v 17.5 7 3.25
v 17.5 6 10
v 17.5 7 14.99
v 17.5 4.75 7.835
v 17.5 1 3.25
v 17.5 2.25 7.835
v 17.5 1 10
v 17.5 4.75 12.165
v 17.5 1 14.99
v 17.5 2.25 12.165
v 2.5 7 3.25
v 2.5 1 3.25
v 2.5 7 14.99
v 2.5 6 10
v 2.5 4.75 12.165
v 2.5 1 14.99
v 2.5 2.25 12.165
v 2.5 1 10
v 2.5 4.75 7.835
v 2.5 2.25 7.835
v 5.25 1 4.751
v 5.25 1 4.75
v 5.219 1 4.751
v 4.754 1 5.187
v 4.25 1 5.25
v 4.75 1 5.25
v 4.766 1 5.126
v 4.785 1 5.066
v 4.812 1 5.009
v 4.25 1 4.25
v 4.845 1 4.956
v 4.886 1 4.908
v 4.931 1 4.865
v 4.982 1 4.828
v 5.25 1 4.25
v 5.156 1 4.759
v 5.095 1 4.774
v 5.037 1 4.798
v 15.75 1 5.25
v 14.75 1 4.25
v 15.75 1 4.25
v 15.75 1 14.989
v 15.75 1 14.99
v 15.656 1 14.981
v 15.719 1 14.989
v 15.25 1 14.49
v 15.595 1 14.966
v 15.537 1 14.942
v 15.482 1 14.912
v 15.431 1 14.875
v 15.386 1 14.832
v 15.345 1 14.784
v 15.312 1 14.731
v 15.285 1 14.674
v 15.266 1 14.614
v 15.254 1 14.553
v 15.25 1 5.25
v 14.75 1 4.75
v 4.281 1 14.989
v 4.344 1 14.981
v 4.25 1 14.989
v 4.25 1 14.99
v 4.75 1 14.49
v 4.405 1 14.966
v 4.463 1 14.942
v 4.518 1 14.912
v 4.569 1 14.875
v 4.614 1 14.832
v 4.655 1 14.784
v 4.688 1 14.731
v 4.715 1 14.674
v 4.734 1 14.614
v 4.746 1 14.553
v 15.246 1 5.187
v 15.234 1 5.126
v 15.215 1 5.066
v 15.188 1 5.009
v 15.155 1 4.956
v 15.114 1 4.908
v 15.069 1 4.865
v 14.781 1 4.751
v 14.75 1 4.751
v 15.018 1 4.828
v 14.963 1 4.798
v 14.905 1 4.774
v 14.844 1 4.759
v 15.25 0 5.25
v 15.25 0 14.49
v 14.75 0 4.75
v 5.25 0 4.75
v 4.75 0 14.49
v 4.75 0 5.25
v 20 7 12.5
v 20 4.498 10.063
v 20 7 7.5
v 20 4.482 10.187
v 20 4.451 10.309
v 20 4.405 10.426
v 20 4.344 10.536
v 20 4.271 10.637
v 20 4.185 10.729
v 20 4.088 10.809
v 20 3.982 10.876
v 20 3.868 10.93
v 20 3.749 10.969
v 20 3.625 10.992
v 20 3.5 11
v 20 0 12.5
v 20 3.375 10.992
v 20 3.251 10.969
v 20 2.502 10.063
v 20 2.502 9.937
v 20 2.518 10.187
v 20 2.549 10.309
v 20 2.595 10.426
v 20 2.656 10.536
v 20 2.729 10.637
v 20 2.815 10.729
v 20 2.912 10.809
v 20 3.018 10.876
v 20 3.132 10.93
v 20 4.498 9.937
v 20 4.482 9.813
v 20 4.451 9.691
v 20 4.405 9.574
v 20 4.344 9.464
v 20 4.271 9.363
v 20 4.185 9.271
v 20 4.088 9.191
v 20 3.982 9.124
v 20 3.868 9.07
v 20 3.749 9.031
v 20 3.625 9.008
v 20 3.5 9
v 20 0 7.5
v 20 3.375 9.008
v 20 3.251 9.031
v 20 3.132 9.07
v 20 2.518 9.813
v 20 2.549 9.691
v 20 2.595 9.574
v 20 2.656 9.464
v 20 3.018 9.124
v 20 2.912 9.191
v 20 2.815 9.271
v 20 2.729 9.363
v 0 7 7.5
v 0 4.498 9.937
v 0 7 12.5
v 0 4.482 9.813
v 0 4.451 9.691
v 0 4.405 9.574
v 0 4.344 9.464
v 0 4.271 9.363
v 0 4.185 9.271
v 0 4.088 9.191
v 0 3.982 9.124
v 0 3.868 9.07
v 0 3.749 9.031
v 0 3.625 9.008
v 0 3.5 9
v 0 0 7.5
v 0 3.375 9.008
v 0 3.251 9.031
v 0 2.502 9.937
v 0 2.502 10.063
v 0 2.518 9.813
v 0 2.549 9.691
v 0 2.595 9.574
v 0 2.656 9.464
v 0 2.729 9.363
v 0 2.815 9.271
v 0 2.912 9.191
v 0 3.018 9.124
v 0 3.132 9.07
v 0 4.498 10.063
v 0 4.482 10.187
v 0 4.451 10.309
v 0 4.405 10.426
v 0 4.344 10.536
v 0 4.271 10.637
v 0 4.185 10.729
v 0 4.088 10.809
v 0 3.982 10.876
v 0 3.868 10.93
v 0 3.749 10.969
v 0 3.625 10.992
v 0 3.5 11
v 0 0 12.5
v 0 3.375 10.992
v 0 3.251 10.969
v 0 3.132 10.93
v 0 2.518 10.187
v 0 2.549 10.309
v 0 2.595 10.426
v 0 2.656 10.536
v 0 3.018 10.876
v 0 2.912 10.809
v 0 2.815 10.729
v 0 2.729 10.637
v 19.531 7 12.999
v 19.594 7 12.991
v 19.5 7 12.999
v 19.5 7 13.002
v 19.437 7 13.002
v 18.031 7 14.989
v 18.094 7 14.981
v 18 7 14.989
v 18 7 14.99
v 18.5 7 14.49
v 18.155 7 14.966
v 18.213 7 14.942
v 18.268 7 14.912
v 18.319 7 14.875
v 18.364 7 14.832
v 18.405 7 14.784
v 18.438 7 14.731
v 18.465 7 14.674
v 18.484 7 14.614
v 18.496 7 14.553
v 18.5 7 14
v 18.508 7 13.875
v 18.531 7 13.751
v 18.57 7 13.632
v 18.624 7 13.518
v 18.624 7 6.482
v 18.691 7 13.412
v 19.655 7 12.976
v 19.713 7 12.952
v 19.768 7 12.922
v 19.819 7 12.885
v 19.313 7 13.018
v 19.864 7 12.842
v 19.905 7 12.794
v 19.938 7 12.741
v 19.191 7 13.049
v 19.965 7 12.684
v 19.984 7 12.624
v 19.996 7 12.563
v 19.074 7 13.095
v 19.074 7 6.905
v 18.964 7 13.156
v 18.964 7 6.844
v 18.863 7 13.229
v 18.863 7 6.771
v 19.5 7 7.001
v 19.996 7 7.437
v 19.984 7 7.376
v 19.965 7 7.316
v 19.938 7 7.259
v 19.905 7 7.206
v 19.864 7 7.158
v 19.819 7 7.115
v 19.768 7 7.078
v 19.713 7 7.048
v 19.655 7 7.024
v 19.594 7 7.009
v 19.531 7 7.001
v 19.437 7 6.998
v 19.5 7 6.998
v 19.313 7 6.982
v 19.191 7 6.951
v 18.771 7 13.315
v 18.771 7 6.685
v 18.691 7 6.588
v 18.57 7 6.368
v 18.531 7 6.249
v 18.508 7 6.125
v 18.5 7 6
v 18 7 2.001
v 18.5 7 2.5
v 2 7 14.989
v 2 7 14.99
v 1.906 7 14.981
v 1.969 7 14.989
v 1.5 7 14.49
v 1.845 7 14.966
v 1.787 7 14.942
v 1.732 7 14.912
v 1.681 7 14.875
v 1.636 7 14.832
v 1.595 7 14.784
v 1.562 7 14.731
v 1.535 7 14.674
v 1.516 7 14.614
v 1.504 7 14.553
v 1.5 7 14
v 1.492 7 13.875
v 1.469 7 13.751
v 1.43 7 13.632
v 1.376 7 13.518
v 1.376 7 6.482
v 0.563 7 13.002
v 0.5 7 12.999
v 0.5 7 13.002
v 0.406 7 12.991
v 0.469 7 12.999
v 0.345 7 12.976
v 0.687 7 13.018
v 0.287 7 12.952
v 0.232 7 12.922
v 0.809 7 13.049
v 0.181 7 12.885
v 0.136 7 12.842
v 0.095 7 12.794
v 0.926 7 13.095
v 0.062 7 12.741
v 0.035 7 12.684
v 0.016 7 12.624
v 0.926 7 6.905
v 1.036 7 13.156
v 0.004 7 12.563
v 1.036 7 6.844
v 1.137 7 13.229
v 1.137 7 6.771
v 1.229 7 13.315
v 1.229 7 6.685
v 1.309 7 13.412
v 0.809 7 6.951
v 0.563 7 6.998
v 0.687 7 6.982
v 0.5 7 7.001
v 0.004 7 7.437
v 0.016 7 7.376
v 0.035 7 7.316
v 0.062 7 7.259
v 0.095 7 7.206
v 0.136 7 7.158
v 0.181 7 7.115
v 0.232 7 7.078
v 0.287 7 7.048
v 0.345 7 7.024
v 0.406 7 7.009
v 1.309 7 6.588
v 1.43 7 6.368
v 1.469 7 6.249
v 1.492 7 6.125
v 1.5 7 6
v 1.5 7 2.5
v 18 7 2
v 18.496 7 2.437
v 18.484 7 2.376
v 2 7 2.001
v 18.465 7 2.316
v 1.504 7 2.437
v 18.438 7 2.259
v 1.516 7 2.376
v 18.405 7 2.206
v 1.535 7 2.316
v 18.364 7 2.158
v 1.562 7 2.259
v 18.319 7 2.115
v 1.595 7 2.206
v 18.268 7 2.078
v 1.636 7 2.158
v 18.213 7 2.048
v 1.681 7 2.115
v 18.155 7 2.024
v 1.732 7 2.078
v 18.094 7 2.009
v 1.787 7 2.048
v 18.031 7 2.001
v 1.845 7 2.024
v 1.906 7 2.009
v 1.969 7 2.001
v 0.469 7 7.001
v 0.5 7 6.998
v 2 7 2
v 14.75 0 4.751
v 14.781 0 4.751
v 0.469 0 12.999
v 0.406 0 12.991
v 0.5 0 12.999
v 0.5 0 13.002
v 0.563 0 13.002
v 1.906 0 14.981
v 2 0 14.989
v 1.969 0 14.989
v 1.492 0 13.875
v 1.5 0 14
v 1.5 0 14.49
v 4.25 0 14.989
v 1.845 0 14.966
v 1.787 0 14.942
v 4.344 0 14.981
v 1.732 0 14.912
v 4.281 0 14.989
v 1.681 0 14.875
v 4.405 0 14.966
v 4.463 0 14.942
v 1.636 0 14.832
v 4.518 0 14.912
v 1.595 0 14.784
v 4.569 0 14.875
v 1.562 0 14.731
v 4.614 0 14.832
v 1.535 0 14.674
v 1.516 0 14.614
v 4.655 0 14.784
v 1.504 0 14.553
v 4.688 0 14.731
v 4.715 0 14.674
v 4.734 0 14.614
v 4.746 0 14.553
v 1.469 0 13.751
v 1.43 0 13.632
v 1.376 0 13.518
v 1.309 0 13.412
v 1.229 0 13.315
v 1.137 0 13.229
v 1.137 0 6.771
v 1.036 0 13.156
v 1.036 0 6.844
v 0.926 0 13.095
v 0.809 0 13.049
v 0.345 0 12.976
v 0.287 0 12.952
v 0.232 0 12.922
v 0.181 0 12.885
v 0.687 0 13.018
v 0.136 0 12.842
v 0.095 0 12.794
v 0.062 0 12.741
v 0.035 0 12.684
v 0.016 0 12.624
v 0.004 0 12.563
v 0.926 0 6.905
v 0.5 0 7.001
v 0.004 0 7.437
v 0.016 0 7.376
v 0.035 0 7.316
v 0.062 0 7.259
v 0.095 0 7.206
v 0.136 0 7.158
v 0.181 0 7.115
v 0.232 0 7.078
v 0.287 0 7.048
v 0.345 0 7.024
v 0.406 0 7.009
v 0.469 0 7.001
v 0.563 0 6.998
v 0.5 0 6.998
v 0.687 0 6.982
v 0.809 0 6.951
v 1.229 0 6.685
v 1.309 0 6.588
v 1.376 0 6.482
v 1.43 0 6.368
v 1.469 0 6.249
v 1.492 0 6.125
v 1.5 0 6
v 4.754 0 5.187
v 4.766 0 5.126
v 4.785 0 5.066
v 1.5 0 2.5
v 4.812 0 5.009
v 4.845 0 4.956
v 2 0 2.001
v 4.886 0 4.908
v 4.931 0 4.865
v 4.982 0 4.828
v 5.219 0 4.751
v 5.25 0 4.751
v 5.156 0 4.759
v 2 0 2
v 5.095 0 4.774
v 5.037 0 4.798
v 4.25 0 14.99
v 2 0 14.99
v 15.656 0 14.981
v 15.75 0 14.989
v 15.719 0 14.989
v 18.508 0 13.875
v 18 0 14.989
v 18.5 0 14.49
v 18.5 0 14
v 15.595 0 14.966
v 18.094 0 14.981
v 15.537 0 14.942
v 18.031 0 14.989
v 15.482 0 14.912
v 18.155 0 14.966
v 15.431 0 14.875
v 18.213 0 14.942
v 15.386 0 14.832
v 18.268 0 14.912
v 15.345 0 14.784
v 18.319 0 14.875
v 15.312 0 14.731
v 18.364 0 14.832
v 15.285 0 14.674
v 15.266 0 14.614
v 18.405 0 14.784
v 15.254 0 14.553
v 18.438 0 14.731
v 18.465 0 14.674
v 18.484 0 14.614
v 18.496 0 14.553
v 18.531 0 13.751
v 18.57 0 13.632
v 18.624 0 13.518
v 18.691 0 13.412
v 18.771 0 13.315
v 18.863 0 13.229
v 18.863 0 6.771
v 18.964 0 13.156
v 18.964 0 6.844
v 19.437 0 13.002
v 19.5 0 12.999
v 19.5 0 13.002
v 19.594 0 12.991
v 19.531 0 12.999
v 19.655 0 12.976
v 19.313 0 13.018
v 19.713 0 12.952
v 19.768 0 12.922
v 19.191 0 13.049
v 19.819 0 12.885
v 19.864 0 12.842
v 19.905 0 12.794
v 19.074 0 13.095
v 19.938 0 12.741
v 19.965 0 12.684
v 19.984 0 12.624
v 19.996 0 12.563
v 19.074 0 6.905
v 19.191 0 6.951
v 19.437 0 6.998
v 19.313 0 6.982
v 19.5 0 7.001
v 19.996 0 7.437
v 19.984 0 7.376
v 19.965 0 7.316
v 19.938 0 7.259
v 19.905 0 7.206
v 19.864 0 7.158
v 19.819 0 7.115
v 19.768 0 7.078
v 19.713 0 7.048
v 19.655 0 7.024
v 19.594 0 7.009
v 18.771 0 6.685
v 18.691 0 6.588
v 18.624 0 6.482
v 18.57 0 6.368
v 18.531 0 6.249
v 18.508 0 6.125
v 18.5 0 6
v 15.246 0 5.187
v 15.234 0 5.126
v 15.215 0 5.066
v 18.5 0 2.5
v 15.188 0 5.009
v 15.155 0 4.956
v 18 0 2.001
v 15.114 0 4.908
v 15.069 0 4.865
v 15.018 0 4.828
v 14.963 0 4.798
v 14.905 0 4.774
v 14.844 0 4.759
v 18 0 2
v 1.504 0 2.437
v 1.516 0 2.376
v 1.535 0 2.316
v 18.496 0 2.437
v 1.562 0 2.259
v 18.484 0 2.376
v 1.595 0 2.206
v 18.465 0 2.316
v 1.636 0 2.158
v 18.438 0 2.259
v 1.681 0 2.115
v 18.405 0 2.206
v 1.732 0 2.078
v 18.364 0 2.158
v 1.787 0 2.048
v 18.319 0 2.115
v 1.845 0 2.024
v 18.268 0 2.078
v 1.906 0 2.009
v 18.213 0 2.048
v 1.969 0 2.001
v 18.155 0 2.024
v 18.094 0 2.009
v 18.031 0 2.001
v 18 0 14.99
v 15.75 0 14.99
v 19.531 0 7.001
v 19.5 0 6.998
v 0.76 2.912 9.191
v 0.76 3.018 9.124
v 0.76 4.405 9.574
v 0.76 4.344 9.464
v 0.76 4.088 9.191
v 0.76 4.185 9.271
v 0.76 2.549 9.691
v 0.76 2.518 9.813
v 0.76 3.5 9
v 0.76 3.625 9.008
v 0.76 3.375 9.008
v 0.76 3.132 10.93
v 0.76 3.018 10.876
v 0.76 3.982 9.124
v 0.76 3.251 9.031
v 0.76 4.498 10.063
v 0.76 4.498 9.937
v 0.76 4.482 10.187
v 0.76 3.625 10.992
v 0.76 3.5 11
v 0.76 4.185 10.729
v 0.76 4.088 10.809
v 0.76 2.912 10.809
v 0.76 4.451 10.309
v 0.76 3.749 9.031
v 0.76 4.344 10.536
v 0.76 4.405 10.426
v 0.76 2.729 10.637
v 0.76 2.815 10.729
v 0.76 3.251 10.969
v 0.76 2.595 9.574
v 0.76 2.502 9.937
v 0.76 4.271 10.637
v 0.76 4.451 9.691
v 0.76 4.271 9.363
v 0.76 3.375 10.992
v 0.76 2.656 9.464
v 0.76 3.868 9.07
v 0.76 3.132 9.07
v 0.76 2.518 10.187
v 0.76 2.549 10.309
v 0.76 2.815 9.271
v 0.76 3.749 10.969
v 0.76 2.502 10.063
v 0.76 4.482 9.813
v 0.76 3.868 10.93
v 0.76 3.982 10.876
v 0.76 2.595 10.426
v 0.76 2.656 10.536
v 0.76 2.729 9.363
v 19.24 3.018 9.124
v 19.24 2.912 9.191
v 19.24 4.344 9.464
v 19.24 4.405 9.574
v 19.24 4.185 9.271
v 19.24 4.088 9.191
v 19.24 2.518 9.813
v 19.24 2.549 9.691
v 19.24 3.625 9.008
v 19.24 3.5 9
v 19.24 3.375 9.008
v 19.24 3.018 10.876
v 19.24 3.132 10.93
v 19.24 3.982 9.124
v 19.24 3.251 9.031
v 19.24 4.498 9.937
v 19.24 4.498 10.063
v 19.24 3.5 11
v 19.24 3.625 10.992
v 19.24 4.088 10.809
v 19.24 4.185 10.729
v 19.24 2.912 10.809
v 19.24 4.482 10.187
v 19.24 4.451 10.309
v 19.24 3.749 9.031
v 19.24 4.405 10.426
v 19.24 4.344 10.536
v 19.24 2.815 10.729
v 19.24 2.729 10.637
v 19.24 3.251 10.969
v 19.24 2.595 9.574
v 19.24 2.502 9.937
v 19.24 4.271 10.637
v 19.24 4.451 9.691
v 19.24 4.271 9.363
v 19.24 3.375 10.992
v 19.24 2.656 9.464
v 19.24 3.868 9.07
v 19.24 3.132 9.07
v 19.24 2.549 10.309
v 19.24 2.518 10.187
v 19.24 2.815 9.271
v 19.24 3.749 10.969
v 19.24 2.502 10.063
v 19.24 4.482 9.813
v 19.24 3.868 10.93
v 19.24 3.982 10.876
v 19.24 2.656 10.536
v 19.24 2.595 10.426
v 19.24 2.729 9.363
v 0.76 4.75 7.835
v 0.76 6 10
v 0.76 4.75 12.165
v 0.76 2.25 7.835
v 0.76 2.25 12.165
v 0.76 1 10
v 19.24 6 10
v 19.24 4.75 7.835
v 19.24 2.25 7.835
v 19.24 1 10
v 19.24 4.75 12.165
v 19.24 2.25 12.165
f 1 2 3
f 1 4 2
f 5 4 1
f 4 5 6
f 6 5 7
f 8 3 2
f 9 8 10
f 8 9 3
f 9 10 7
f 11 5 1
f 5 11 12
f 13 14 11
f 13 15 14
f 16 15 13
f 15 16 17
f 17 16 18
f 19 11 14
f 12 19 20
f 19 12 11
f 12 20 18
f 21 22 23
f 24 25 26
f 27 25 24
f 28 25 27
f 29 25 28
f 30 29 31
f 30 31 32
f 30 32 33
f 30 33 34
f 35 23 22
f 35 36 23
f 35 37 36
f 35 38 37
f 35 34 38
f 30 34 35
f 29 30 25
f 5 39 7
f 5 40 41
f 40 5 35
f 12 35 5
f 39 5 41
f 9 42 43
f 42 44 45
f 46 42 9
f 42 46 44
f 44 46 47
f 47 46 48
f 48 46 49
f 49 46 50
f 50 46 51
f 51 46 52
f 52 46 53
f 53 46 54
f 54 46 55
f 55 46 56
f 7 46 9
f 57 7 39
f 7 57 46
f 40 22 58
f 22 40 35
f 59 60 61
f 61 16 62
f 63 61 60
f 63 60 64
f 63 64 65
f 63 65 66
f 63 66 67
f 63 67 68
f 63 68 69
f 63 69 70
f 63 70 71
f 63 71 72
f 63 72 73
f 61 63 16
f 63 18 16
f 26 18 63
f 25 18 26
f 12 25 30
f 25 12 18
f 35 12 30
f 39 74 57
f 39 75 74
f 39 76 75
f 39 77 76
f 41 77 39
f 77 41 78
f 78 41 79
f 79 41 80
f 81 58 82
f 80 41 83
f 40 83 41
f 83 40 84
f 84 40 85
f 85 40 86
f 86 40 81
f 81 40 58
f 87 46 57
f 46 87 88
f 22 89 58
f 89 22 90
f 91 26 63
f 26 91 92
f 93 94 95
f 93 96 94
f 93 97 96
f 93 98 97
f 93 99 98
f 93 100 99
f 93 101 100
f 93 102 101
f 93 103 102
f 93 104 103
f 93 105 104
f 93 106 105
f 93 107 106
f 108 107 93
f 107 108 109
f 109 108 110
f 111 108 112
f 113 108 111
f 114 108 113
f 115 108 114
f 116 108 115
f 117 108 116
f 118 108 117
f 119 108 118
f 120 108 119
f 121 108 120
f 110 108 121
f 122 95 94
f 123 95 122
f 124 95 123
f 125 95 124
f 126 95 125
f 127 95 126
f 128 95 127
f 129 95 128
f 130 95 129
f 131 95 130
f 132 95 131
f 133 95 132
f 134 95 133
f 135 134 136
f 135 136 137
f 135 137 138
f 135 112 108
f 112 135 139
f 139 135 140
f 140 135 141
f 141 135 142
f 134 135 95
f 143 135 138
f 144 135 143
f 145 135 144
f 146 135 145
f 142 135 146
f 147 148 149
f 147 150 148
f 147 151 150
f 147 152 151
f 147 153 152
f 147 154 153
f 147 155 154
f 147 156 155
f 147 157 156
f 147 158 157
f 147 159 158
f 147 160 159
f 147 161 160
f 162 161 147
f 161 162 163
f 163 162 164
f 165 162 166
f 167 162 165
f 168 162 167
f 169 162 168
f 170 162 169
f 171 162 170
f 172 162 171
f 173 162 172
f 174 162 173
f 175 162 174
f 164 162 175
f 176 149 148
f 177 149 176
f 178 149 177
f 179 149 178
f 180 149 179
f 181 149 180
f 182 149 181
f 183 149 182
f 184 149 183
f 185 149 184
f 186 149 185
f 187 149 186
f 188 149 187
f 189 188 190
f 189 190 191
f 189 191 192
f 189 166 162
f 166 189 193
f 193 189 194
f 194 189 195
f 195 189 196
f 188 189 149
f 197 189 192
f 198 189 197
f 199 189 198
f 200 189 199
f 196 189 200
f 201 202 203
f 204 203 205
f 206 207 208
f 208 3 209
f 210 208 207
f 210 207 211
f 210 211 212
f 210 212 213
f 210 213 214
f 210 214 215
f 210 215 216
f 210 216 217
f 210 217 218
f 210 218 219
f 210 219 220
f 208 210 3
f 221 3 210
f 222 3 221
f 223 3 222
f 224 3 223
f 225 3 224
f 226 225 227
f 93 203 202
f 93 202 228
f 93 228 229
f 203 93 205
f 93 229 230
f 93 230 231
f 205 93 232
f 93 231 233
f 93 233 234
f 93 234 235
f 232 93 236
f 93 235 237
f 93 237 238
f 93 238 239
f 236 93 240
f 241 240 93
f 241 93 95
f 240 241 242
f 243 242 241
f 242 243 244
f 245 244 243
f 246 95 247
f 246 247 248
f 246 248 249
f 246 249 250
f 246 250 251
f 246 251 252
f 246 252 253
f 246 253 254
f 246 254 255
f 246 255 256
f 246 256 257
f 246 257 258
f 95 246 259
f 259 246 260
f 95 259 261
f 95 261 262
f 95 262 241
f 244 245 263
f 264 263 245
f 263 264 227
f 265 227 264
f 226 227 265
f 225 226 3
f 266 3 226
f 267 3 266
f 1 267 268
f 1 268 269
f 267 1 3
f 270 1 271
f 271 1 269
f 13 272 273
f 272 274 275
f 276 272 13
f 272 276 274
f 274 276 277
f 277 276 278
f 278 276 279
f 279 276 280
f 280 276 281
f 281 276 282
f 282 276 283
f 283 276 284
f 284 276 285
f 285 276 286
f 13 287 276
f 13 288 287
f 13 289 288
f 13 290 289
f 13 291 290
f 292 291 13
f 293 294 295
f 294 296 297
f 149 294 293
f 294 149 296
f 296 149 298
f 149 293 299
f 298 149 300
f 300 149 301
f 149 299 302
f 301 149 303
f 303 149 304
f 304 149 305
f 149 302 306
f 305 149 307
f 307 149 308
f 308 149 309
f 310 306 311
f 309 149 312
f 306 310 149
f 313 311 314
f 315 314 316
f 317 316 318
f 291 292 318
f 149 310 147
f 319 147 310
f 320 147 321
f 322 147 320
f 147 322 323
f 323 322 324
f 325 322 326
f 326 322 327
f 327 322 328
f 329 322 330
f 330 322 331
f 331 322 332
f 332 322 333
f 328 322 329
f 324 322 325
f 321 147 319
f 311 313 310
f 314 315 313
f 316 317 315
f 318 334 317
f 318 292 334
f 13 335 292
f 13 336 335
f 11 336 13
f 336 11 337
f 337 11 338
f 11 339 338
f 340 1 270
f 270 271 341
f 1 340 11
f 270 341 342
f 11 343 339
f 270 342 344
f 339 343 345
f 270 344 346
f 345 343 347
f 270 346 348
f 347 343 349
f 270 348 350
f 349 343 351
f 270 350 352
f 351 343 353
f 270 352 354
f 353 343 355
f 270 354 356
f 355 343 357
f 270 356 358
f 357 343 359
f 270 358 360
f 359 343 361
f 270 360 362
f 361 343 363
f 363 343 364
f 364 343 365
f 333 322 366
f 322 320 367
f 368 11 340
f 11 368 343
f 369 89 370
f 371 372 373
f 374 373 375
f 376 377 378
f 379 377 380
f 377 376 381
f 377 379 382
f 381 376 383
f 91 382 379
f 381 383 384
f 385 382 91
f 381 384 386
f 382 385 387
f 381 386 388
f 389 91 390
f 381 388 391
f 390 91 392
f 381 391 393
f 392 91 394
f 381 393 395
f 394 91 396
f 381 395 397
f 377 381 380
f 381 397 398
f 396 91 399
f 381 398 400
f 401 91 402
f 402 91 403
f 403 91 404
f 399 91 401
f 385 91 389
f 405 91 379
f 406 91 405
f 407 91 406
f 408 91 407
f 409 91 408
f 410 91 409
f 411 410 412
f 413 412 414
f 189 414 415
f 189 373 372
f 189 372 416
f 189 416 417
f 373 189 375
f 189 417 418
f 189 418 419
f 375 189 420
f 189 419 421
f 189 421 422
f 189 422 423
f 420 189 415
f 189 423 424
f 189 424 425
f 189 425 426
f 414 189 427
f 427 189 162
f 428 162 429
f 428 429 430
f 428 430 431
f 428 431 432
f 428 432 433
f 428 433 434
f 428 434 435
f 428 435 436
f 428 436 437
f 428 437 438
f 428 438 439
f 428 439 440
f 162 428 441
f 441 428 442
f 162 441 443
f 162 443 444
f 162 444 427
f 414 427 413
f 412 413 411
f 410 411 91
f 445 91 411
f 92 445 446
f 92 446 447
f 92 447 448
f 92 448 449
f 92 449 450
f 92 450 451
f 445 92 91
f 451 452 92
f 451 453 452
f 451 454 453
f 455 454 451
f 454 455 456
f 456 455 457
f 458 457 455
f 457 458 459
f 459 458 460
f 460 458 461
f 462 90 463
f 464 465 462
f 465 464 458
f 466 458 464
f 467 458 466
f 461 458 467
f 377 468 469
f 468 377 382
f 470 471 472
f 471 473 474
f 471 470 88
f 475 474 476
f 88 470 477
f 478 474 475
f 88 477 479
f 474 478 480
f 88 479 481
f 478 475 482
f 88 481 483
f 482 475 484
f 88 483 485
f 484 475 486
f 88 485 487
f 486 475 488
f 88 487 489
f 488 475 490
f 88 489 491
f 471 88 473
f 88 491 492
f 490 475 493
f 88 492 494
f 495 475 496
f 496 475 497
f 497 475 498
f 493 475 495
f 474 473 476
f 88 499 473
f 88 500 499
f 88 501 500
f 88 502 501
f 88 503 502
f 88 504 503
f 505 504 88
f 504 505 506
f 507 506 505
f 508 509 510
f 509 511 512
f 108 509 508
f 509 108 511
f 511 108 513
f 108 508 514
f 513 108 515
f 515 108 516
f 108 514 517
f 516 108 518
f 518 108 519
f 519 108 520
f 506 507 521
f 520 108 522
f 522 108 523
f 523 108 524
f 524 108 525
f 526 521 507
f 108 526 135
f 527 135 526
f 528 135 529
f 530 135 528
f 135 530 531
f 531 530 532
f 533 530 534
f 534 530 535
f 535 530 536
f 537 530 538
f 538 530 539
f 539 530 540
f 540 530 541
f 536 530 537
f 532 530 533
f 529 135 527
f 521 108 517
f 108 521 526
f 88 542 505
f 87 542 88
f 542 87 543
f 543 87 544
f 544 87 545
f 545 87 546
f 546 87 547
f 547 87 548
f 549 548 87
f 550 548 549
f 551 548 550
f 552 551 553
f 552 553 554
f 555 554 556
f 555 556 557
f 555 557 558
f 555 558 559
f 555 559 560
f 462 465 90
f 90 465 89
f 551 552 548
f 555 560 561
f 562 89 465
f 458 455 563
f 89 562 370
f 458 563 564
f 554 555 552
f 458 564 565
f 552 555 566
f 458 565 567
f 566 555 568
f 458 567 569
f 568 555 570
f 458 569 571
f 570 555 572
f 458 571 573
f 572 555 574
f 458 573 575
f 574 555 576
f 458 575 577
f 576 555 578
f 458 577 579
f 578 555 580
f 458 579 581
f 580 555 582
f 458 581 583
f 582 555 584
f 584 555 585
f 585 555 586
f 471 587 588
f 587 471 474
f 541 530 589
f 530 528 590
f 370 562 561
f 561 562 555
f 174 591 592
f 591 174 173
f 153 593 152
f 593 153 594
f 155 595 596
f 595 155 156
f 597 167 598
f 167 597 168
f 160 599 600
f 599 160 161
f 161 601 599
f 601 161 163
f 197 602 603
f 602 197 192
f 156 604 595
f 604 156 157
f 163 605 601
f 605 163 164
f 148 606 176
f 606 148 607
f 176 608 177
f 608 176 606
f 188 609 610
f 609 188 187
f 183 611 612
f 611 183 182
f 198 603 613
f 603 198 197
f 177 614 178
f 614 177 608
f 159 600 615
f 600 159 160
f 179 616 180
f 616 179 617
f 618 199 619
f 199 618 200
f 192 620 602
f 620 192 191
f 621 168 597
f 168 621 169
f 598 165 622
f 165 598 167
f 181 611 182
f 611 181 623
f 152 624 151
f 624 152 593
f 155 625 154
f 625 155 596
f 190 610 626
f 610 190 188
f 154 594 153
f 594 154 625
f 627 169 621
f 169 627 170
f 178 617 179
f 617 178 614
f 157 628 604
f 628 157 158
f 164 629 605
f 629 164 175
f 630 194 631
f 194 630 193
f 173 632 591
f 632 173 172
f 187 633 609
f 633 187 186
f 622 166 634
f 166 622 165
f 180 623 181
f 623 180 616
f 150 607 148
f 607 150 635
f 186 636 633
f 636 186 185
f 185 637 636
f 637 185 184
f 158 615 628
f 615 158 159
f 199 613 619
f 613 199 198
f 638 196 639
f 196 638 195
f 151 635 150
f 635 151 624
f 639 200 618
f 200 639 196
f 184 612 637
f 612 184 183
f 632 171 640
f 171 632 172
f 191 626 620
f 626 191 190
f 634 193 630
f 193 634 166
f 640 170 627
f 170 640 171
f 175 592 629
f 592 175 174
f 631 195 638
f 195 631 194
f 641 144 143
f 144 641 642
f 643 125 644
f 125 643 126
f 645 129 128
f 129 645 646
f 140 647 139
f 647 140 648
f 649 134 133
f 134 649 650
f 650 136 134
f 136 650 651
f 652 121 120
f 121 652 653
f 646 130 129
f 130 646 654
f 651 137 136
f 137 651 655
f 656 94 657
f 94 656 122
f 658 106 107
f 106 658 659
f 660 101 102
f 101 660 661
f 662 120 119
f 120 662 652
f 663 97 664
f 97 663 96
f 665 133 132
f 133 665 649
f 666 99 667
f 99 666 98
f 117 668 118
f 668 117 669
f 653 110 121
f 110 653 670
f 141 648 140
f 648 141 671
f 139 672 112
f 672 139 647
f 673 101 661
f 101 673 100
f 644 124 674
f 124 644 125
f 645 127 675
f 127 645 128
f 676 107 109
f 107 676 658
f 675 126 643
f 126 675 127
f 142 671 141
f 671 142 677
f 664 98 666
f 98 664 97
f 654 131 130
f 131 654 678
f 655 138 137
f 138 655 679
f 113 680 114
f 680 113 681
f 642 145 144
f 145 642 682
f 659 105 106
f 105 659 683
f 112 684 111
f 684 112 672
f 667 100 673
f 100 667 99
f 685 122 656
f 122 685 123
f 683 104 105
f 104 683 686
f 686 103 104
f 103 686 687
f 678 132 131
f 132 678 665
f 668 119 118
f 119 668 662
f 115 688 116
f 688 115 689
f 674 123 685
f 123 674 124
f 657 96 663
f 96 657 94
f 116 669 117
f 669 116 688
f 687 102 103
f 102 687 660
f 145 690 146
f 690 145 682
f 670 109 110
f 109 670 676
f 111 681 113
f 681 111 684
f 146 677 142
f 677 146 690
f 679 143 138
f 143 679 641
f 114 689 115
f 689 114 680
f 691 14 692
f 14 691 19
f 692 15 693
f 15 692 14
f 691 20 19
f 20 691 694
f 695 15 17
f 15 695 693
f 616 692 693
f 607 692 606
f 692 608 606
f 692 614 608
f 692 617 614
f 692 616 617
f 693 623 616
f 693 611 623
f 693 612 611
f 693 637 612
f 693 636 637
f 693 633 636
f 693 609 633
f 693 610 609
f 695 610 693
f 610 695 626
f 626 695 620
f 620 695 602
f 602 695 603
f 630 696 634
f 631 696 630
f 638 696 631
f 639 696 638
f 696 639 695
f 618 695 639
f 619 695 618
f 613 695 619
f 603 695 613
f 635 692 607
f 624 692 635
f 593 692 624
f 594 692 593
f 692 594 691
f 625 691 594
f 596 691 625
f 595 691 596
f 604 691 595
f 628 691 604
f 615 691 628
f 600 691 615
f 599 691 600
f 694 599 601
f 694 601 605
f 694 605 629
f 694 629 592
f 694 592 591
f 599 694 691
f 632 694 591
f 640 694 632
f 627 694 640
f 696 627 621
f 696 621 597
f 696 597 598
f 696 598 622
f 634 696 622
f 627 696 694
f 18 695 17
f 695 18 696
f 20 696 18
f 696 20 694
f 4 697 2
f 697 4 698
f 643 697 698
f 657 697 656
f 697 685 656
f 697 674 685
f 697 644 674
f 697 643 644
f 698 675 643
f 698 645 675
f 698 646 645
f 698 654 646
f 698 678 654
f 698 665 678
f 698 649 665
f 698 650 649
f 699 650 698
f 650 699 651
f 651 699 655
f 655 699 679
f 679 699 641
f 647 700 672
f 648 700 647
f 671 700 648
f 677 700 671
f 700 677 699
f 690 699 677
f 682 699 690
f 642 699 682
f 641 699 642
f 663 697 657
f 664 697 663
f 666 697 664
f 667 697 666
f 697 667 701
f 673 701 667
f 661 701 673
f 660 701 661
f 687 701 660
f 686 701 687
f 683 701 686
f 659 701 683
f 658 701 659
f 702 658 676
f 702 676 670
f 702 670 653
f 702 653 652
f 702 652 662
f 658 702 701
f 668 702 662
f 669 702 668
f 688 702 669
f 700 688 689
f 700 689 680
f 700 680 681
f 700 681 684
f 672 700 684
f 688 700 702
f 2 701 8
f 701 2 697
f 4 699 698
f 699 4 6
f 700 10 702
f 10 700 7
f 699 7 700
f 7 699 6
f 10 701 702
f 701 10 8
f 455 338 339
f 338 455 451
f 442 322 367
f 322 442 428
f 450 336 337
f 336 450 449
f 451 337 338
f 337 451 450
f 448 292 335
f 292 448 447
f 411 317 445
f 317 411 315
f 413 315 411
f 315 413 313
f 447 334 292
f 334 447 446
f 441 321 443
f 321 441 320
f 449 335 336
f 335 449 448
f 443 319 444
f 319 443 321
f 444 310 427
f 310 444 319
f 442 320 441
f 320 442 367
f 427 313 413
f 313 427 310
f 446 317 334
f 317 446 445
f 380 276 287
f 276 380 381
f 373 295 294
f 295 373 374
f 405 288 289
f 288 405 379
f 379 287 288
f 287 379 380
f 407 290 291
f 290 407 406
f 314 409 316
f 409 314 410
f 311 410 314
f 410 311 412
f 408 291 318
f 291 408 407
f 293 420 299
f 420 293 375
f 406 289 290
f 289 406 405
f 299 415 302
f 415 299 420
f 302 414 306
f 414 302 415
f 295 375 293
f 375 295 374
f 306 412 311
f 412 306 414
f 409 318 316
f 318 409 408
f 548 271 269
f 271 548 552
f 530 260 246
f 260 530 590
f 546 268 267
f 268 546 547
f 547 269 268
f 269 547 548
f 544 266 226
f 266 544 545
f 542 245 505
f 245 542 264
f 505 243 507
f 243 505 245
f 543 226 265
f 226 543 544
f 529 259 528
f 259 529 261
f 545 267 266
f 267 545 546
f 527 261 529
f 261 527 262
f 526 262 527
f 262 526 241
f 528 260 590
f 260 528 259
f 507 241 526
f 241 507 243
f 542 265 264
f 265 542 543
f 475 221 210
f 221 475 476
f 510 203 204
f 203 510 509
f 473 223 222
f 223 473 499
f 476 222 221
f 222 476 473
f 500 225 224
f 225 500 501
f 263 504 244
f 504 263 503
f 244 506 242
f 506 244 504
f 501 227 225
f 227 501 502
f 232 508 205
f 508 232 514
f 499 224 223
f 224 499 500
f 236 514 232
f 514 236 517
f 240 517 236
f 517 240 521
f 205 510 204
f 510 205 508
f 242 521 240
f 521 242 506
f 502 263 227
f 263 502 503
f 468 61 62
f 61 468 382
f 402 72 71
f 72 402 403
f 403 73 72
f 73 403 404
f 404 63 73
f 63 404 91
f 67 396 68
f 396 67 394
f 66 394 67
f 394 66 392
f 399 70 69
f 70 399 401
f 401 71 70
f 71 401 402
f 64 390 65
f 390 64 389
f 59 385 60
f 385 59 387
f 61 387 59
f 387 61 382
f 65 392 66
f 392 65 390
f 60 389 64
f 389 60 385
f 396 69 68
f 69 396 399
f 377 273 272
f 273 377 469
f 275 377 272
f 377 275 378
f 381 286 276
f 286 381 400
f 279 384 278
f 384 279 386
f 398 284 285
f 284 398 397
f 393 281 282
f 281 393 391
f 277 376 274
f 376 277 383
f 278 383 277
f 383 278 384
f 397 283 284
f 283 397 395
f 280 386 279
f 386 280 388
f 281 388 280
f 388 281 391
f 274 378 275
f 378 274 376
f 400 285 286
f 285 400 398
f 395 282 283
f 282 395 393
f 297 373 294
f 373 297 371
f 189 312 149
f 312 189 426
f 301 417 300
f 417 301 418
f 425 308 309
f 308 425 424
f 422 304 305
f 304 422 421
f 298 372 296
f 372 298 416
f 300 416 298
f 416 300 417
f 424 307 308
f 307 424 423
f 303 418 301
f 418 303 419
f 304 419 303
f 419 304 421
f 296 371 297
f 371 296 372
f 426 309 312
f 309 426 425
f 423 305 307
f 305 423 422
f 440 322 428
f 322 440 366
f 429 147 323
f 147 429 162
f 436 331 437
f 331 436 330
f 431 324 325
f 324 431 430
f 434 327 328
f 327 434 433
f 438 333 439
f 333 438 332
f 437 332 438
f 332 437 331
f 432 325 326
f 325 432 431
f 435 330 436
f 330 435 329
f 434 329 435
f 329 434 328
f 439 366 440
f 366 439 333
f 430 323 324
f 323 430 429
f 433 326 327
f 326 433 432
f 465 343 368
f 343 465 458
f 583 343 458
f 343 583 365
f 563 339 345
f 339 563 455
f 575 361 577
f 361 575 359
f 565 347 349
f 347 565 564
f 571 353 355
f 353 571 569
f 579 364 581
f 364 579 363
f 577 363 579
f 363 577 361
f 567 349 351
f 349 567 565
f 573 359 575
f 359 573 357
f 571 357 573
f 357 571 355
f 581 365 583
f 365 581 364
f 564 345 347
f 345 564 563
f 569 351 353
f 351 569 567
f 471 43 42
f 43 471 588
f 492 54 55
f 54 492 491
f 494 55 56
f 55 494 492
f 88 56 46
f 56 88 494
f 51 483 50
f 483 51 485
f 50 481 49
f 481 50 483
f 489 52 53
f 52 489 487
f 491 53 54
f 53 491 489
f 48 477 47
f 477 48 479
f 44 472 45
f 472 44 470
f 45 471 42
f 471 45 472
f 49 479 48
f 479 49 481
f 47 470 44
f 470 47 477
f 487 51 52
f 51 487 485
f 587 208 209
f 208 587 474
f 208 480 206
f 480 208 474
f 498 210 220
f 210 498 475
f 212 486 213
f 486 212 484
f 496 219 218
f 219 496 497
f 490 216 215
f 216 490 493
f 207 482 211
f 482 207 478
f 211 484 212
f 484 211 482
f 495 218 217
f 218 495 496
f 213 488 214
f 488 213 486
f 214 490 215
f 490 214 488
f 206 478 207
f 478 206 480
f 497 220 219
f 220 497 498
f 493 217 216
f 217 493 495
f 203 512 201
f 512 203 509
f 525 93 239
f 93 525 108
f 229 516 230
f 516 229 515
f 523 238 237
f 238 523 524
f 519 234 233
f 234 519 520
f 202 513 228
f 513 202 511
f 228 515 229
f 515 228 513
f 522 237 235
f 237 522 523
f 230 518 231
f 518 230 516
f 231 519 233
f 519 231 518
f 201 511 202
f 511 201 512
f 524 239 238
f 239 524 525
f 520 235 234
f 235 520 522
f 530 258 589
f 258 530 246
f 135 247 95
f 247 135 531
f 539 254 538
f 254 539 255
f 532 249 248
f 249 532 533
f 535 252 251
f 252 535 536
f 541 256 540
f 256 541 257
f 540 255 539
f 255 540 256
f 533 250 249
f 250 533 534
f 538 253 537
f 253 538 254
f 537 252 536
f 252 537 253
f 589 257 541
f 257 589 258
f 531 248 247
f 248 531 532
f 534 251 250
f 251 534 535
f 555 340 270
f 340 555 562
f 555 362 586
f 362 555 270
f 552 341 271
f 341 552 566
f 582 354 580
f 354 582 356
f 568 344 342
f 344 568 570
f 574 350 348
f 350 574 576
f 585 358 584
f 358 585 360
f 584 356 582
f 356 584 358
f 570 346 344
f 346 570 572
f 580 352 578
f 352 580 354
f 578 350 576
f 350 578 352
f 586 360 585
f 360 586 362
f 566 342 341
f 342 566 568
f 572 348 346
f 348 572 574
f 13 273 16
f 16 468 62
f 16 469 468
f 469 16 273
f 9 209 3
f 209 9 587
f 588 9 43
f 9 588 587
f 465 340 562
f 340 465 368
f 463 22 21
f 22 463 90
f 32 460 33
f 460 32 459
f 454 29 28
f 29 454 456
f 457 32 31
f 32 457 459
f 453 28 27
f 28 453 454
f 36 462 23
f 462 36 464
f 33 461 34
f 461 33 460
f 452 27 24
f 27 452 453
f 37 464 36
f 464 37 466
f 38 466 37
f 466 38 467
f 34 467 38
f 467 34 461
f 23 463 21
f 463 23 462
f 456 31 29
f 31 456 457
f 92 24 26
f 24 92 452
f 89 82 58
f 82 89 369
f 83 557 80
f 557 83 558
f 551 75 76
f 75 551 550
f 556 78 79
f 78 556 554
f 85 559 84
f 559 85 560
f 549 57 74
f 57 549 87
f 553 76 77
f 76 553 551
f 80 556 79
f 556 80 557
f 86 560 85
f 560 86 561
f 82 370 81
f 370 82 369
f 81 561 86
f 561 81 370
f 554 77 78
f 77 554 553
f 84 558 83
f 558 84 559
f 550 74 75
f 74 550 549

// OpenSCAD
// Type of nuts used
use_locknuts = 0;  // [0:Standard, 1:Locking]

// 20mm or 19mm width
size_20_or_19 = 0;  // [0:20mm, 1:19mm]

module camera() {
    union() {
        cube([15, 7, 13.5]);
        /*
        translate([2.875, -1.99, 2.25]) cube([9.25, 2, 10]);
        translate([7.5, 0.01, 6.75]) rotate([90, 0, 0]) cylinder(d=10, h=10, $fn=50);
        */
        translate([2.25, -9.99, 1.5]) cube([10.5, 10, 10.5]);
    }
}

module side_fillet() {
    union() {
        translate([-0.5, -0.5, 1.5]) cube([2, 8, 5]);
        translate([-0.5, -0.5, 6.5]) cube([1, 8, 1]);
        translate([0.5, 7.5, 6.5]) rotate([90, 0, 0]) cylinder(d=2, h=8, $fn=50);
    }
}

module corner_fillet_large() {
    difference() {
        cube([1, 8, 1]);
        translate([1, 9, 0]) rotate([90, 0, 0]) cylinder(d=1, h=10, $fn=50);
    }
}

module corner_fillet_small() {
    difference() {
        cube([1, 2, 1]);
        translate([0, 3.5, 0]) rotate([90, 0, 0]) cylinder(d=1, h=4, $fn=50);
    }
}

union() {
    difference() {
        // Main body
        difference() {
            cube([20, 7, 20]);
            translate([2.5, 1, 3.25]) camera();
        }
        // Screw & nut holes
        {
            if (use_locknuts) {
                translate([-1, 3.5, 10]) rotate([30, 0, 0]) rotate([0, 90, 0]) cylinder(d=5, h=4.5, $fn=6);
                translate([16.5, 3.5, 10]) rotate([30, 0, 0]) rotate([0, 90, 0]) cylinder(d=5, h=4.5, $fn=6);
            } else {
                translate([-0.5, 3.5, 10]) rotate([0, 90, 0]) cylinder(d=2, h=4, $fn=50);
                translate([16.75, 3.5, 10]) rotate([0, 90, 0]) cylinder(d=2, h=4, $fn=50);
                translate([0.76, 3.5, 10]) rotate([30, 0, 0]) rotate([0, 90, 0]) cylinder(d=5, h=1.75, $fn=6);
                translate([17.49, 3.5, 10]) rotate([30, 0, 0]) rotate([0, 90, 0]) cylinder(d=5, h=1.75, $fn=6);
            }
        }
        // Top and bottom cuts
        {
            translate([-0.5, -0.5, 14.99]) cube([21, 8, 6]);
            translate([-0.5, -0.5, -0.5]) cube([21, 8, 2.5]);
        }
        // Side cuts and fillets
        {
            // Left
            {
                translate([0, 0, -0.5]) side_fillet();
                translate([0, 0, 20.5]) mirror([0, 0, 1]) side_fillet();
            }
            // Right
            {
                translate([20, 0, -0.5]) mirror([1, 0, 0]) side_fillet();
                translate([20, 0, 20.5]) mirror([0, 0, 1]) mirror([1, 0, 0]) side_fillet();
            }
        }
        // External corners fillets
        {
            // Left
            {
                translate([4.25, -0.5, 14.49]) corner_fillet_small();
                translate([1, -0.5, 14.49]) corner_fillet_large();
                translate([-0.5, -0.5, 12.5]) corner_fillet_large();
                translate([-0.5, -0.5, 7.5]) mirror([0, 0, 1]) corner_fillet_large();
                translate([1, -0.5, 2.5]) mirror([0, 0, 1]) corner_fillet_large();
            }
            // Right
            {
                translate([15.75, -0.5, 14.49]) mirror([1, 0, 0]) corner_fillet_small();
                translate([19, -0.5, 14.49]) mirror([1, 0, 0]) corner_fillet_large();
                translate([20.5, -0.5, 12.5]) mirror([1, 0, 0]) corner_fillet_large();
                translate([20.5, -0.5, 7.5]) mirror([0, 0, 1]) mirror([1, 0, 0]) corner_fillet_large();
                translate([19, -0.5, 2.5]) mirror([0, 0, 1]) mirror([1, 0, 0]) corner_fillet_large();
            }
        }
        // Side trims for 19mm
        {
            if (size_20_or_19) {
                translate([-0.5, -1, 5]) cube([1, 9, 10]);
                translate([19.5, -1, 5]) cube([1, 9, 10]);
            }                
        }
    }
    // Internal corners fillets
    {
        translate([4.25, 0, 4.25]) difference() {
            cube([1, 1, 1]);
            translate([1, 1.5, 1]) rotate([90, 0, 0]) cylinder(d=1, h=2, $fn=50);
        }
        translate([14.75, 0, 4.25]) difference() {
            cube([1, 1, 1]);
            translate([0, 1.5, 1]) rotate([90, 0, 0]) cylinder(d=1, h=2, $fn=50);
        }
    }
}
